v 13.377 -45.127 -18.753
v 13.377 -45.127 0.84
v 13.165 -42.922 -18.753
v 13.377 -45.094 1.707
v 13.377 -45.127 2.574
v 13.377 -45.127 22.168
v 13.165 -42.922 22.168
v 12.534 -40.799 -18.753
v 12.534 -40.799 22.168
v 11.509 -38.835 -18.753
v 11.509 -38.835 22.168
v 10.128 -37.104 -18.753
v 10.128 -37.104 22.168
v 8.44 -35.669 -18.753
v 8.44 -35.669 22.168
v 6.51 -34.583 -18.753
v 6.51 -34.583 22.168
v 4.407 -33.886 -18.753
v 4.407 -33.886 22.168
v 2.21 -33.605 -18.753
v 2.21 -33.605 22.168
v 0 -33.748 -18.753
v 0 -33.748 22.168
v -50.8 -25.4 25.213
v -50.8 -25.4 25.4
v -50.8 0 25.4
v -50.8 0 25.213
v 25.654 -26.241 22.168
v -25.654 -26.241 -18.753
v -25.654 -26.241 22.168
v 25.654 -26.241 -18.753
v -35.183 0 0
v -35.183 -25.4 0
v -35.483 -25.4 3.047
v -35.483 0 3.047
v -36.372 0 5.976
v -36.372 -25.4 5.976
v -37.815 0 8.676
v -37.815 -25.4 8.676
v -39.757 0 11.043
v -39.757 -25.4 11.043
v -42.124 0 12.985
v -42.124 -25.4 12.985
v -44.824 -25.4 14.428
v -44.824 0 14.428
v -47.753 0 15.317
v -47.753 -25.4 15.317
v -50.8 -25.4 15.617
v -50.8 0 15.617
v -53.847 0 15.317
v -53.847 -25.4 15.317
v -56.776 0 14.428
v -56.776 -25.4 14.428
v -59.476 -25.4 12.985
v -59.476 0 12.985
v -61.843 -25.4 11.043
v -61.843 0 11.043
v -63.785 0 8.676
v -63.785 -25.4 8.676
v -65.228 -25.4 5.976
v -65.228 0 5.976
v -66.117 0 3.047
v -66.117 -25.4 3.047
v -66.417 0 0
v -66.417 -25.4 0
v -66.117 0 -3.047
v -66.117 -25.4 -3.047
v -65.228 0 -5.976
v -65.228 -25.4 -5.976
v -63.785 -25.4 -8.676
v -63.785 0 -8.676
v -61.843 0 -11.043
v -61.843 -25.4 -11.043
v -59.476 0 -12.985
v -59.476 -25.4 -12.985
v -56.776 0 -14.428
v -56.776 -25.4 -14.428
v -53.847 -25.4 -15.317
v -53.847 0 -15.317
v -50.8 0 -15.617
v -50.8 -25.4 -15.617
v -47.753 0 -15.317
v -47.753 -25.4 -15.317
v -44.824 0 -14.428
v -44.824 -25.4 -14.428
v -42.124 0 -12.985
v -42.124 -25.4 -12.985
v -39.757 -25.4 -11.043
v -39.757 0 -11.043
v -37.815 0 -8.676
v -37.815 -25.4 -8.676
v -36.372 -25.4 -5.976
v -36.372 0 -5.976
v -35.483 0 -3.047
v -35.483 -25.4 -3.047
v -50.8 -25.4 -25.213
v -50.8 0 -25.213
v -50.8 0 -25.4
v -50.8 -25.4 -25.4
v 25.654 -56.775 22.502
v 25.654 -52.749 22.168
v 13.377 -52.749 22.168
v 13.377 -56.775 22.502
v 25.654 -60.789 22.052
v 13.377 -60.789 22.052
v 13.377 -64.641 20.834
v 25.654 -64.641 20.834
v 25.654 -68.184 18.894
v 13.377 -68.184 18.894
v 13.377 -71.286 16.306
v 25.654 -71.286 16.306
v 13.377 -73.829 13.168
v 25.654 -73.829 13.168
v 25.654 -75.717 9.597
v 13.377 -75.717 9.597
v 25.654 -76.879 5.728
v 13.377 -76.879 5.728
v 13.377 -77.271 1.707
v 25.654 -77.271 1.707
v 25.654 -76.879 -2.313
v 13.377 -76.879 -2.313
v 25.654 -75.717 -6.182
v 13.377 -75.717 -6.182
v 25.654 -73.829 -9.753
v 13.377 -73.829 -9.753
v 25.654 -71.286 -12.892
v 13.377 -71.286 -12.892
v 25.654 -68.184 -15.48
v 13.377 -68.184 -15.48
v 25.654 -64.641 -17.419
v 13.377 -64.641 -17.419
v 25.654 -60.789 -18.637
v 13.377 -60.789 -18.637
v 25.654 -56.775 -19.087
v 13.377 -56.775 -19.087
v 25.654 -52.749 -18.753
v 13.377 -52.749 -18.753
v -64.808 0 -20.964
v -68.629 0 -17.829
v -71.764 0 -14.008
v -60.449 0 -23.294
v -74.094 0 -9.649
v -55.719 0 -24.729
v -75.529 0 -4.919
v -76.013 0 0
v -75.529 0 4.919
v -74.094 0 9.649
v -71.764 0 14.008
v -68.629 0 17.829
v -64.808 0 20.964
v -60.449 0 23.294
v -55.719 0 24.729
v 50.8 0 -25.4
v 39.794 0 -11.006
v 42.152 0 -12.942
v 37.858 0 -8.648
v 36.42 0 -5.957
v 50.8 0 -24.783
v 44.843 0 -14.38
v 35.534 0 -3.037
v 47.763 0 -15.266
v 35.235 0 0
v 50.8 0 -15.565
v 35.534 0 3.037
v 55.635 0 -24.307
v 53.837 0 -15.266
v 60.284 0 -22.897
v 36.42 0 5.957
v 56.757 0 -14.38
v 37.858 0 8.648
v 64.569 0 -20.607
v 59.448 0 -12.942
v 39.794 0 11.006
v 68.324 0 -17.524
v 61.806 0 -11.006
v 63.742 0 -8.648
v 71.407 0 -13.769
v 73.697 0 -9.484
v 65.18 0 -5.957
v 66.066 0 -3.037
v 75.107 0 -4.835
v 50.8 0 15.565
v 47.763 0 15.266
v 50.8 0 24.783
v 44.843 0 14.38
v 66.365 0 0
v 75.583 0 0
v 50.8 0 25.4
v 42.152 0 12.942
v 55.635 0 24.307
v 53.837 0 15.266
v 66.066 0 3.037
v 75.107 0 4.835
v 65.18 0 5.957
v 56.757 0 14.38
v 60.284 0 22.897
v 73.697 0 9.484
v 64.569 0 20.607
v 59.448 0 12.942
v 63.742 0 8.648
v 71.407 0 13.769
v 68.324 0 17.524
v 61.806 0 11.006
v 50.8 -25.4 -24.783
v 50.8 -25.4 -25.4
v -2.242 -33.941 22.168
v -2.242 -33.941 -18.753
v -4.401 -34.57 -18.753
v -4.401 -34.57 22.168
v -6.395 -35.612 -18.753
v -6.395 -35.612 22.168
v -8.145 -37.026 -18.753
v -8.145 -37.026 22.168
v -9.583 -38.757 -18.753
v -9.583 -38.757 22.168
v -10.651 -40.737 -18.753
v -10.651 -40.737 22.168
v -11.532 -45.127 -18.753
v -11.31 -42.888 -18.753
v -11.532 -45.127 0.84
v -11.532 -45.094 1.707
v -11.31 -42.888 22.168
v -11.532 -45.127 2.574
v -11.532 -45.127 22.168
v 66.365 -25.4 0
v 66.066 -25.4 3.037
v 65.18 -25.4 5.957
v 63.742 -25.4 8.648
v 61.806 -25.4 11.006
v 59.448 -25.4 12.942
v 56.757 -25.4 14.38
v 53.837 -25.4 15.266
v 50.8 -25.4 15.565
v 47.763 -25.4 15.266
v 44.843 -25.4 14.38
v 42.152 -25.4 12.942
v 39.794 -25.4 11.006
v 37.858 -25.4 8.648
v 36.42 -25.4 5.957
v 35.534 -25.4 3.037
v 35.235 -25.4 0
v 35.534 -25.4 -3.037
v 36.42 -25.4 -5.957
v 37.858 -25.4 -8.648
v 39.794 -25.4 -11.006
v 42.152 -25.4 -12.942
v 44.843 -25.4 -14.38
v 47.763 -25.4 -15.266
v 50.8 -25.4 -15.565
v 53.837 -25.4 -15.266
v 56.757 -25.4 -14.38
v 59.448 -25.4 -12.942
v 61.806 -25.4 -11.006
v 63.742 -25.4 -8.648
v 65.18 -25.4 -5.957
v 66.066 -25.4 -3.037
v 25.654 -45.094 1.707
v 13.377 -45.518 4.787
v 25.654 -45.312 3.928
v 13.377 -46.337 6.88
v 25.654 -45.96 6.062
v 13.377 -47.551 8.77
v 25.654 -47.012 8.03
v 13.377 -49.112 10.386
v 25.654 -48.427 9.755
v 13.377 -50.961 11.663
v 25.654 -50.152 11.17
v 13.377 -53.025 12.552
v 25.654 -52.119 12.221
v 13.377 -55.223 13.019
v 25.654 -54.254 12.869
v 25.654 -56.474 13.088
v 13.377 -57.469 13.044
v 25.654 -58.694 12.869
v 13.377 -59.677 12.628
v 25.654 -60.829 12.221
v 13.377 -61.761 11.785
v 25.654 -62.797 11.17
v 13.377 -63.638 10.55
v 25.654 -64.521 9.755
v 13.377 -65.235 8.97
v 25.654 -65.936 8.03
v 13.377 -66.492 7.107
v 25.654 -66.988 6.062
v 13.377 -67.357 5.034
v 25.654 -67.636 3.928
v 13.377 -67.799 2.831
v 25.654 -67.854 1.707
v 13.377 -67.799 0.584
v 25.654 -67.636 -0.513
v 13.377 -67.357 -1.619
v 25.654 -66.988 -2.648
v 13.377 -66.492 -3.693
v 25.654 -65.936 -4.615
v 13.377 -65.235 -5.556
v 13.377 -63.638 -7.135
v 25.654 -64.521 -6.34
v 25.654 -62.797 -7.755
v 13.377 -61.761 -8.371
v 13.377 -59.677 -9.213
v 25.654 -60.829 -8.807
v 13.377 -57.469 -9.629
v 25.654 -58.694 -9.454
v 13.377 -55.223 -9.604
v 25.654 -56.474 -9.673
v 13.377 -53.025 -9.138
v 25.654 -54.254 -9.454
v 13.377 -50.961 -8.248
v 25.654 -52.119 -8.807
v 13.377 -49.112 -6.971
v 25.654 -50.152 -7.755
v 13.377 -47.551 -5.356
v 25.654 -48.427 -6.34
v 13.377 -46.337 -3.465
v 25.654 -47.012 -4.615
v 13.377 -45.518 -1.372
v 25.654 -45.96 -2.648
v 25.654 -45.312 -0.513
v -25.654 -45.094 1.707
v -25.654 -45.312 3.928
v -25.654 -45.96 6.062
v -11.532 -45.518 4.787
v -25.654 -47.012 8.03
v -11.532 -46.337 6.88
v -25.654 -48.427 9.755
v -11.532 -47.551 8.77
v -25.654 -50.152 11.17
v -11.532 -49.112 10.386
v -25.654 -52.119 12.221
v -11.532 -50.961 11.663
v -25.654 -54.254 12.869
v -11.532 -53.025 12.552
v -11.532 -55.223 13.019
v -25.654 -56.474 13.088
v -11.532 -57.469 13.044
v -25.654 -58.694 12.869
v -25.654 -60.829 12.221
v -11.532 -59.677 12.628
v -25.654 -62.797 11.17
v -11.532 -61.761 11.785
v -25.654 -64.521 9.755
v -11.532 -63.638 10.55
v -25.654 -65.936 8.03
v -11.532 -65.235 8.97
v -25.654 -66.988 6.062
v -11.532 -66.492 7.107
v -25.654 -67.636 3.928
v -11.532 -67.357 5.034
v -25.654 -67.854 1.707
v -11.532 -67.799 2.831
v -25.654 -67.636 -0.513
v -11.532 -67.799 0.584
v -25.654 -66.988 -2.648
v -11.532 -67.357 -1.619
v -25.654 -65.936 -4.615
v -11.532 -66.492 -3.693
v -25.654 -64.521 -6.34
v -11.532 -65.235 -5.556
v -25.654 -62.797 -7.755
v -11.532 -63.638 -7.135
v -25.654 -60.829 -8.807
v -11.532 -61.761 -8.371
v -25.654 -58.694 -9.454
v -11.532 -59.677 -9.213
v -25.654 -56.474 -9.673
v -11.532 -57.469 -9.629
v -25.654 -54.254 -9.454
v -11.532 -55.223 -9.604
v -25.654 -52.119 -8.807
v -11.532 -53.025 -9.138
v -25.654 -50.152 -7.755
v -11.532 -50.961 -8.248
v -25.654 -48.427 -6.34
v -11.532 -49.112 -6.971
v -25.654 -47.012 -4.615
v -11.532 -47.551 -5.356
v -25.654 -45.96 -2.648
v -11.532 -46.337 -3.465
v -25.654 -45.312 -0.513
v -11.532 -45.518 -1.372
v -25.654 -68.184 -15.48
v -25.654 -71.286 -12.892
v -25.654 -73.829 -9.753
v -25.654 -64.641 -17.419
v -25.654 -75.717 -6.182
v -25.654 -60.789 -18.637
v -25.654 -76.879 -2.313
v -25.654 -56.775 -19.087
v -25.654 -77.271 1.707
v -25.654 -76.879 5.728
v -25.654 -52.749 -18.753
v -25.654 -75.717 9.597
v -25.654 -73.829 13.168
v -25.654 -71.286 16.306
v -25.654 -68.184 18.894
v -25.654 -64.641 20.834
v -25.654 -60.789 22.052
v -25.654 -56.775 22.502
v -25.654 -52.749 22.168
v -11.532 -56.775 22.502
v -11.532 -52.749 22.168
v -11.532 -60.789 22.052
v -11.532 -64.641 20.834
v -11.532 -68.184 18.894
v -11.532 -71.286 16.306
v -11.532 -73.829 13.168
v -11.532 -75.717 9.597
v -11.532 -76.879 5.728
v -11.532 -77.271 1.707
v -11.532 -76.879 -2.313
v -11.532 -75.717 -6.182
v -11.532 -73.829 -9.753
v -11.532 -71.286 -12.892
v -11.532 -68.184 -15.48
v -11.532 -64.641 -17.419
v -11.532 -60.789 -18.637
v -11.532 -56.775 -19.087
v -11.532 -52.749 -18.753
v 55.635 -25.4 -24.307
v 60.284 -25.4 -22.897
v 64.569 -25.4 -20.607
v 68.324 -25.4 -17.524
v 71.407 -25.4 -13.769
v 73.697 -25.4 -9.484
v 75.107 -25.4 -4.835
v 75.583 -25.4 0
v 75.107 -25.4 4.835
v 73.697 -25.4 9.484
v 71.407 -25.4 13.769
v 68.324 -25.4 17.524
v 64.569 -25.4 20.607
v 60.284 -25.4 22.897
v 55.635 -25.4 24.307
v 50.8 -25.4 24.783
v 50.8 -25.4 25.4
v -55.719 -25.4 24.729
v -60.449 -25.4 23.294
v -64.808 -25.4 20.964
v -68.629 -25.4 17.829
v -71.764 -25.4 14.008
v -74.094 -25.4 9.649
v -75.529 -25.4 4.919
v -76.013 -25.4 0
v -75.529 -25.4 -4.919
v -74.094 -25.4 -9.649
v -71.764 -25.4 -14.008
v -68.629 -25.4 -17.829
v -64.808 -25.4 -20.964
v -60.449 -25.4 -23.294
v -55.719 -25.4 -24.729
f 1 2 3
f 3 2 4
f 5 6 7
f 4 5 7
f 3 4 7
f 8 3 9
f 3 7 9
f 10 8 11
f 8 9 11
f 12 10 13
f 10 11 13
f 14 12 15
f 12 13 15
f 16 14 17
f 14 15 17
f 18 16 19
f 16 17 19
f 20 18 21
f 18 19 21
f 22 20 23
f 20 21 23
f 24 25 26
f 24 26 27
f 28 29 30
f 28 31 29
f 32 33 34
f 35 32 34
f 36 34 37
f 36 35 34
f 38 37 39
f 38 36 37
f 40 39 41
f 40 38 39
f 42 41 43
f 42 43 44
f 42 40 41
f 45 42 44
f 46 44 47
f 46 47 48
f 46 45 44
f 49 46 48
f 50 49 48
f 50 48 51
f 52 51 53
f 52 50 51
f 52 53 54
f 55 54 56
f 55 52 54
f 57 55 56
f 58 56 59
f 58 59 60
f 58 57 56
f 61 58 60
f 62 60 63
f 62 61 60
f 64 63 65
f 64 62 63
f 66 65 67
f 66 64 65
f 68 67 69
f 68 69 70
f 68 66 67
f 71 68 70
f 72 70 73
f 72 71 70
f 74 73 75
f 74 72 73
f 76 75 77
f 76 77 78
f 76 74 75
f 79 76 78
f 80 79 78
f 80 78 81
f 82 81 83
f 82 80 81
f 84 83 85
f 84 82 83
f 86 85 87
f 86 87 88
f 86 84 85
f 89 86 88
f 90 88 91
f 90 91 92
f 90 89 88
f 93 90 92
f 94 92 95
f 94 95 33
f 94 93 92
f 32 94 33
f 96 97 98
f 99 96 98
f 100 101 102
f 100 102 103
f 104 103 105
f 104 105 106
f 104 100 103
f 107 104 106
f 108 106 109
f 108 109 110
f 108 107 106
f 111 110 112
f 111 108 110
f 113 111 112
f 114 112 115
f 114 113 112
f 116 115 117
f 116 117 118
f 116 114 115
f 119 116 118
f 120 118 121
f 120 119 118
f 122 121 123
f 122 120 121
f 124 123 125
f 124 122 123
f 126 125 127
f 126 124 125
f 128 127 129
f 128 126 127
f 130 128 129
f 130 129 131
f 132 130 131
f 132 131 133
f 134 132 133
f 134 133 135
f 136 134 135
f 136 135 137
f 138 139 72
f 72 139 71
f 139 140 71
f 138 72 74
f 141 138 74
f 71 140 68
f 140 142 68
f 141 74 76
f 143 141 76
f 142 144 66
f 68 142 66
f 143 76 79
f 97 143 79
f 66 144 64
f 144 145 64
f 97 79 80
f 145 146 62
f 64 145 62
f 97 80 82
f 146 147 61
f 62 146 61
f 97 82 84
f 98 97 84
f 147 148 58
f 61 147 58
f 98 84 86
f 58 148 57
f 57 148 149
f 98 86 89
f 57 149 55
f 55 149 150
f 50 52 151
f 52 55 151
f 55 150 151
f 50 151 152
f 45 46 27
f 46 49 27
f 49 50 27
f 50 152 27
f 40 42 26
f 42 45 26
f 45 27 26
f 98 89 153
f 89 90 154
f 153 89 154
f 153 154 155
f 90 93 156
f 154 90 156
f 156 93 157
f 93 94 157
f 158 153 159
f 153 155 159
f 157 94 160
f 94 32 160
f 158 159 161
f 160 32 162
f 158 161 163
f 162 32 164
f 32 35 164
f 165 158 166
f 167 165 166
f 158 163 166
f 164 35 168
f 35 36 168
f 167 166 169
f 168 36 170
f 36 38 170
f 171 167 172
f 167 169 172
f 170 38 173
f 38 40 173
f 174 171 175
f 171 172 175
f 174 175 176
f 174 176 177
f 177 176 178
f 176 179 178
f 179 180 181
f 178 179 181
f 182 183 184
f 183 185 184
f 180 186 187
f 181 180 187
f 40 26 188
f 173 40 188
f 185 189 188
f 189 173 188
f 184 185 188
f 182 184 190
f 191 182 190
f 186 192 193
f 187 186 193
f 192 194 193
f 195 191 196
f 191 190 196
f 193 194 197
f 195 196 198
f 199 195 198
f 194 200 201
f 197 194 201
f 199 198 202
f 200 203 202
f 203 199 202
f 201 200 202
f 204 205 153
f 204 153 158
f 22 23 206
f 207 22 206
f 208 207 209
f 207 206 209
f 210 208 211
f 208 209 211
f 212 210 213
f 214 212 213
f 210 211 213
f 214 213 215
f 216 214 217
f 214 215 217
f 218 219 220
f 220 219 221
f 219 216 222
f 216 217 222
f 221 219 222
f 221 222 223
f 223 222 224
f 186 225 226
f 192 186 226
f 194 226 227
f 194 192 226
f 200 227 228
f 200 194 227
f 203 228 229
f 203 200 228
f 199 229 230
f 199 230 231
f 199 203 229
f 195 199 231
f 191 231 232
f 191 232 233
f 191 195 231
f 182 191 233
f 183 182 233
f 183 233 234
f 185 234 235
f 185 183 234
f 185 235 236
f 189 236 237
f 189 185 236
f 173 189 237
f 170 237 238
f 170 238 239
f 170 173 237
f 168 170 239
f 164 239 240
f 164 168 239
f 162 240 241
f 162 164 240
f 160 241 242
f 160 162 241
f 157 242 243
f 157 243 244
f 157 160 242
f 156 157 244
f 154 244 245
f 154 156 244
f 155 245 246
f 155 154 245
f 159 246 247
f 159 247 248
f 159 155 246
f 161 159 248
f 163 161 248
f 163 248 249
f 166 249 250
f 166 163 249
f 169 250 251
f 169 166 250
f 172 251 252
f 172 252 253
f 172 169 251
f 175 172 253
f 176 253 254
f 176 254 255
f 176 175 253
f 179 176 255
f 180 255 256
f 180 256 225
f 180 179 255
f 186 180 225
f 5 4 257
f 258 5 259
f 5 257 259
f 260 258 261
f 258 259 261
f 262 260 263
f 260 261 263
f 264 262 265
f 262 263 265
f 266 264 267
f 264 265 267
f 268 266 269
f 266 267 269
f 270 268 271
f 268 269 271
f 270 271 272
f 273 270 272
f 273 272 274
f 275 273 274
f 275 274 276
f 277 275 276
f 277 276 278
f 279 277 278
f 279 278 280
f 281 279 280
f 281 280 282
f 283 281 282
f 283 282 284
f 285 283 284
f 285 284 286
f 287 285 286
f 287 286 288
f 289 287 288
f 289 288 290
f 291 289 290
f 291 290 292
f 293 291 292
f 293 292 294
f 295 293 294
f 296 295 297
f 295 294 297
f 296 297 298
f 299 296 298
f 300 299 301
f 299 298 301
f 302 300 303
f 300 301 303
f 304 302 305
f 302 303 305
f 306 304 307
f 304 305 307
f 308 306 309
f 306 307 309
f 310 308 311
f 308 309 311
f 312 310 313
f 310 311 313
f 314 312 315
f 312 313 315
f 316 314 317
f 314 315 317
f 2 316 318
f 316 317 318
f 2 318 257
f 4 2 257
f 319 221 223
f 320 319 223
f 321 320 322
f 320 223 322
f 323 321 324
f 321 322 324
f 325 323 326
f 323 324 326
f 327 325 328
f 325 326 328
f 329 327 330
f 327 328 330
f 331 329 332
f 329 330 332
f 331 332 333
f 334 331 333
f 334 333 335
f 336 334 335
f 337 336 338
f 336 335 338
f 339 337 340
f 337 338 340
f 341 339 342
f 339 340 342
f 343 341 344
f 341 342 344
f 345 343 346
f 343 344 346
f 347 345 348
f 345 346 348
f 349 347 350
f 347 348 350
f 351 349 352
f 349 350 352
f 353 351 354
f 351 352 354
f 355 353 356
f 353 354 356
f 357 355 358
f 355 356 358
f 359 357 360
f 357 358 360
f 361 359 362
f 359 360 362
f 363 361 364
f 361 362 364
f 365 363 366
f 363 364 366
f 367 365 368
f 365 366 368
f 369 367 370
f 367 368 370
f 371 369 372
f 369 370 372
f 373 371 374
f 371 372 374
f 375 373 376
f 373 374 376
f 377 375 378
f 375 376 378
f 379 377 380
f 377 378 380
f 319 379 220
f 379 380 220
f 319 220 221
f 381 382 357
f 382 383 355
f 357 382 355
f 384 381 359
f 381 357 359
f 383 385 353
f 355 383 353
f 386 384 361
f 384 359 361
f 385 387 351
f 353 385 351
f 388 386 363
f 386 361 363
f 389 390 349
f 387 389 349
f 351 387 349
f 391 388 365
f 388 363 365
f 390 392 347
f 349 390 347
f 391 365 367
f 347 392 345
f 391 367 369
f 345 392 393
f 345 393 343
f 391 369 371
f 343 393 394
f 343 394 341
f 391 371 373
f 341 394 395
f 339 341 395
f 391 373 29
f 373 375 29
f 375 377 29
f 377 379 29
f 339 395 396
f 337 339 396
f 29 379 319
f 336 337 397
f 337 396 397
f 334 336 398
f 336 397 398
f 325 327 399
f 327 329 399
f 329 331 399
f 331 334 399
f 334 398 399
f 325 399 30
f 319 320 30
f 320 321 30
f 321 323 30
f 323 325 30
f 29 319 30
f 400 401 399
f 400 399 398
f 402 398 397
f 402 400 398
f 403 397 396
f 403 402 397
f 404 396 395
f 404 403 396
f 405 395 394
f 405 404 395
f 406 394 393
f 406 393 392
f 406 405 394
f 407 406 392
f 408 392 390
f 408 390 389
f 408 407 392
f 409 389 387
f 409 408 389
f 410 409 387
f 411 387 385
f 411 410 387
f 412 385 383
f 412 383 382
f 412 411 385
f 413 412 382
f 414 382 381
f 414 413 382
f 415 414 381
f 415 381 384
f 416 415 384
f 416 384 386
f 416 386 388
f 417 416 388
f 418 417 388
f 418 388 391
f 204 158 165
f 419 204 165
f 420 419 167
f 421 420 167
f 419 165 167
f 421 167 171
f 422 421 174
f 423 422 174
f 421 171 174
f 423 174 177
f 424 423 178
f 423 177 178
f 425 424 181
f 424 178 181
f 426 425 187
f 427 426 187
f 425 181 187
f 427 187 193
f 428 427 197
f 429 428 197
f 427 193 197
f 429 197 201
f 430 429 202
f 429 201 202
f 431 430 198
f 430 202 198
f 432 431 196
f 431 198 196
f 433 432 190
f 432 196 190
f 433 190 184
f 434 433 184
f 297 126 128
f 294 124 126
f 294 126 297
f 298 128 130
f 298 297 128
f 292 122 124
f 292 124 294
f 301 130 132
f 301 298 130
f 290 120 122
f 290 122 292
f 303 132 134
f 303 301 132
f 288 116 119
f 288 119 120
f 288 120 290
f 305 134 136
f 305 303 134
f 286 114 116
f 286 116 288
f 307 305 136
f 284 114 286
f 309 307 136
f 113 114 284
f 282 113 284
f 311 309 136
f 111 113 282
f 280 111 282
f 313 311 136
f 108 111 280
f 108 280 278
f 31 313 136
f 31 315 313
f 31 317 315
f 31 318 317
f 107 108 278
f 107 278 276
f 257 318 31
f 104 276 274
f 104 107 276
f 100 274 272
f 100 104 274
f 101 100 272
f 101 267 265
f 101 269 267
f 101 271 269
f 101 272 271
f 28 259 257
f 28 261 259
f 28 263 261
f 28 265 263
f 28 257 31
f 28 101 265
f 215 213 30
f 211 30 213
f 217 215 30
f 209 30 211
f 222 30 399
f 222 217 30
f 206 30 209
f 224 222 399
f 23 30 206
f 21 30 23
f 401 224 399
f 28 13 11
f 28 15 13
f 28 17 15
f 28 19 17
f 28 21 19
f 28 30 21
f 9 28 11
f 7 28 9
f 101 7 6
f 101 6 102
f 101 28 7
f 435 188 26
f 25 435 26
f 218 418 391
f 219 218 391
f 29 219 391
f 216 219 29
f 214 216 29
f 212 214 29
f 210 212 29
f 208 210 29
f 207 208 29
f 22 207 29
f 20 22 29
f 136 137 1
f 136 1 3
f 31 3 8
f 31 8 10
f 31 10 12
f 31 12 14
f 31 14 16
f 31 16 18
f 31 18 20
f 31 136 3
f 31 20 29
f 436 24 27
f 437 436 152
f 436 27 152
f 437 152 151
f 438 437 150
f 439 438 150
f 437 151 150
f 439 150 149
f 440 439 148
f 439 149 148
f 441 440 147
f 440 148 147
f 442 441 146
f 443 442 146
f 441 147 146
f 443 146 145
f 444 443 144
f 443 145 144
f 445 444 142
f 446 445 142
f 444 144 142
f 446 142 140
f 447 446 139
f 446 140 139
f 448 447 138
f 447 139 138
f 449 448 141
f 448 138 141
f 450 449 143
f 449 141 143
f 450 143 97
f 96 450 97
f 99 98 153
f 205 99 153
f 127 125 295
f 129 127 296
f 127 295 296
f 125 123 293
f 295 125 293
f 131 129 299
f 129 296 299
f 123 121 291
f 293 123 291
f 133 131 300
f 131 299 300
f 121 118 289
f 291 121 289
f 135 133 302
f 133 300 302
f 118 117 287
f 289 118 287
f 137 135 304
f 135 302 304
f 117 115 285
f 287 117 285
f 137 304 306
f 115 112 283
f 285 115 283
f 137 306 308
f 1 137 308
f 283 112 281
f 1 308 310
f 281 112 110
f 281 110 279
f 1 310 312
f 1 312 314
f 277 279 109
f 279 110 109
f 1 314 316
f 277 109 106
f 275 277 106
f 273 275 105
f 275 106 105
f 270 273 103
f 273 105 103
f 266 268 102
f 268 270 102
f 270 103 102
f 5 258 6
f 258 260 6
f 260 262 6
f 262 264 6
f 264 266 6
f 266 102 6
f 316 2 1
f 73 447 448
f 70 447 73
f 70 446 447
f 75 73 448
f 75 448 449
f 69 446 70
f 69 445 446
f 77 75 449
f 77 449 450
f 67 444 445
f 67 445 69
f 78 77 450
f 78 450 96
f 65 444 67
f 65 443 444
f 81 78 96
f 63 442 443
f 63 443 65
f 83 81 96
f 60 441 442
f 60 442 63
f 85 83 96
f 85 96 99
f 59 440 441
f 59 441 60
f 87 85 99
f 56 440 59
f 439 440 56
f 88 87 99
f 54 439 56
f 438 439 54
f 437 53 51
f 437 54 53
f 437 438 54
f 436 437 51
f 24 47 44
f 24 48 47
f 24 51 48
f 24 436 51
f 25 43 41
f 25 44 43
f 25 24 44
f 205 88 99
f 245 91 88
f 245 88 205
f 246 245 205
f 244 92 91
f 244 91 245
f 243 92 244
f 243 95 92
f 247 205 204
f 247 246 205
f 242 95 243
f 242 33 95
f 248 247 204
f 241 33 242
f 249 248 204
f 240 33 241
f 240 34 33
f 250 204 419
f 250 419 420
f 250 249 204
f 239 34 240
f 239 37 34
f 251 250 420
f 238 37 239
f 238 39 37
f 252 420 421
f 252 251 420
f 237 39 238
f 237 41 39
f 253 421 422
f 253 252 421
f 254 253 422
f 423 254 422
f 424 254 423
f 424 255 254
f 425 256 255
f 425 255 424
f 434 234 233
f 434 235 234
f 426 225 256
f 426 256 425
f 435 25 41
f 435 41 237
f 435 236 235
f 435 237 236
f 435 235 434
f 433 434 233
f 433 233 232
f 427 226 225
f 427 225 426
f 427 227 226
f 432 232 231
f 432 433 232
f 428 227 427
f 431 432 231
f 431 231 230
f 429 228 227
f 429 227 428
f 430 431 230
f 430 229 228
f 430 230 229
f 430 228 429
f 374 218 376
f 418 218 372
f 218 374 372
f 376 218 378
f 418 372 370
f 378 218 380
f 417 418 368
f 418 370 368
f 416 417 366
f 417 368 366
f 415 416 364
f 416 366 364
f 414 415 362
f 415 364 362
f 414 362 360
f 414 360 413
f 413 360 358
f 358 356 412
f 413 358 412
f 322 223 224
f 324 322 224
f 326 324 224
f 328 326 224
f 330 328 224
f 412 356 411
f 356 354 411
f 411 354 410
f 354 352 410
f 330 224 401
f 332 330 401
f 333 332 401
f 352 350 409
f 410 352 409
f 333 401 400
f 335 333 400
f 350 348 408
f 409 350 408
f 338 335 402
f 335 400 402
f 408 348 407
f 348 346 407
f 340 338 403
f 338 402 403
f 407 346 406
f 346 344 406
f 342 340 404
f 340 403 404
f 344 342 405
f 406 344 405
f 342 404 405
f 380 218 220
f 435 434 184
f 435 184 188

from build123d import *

# Parameters (mm, degrees)
F0_R     = 15.616617
F0_R_2   = 15.565152
F1_DEPTH = 25.4
F3_DEPTH = 25.654
F5_DEPTH = 54.356
F6_R     = 11.380307
F7_DEPTH = 94.234


with BuildPart() as f1:
    # F0 (on Front) → F1 (new body)
    with BuildSketch(Plane.XZ):
        with BuildLine():
            Line((-50.8, -25.4), (50.8, -25.4))
            Line((50.8, -25.4), (50.8, -24.783274))
            ThreePointArc((50.8, -24.783274), (75.583274, 0), (50.8, 24.783274))
            Line((50.8, 24.783274), (50.8, 25.4))
            Line((50.8, 25.4), (-50.8, 25.4))
            Line((-50.8, 25.4), (-50.8, 25.213412))
            ThreePointArc((-50.8, 25.213412), (-76.013412, 0), (-50.8, -25.213412))
            Line((-50.8, -25.213412), (-50.8, -25.4))
        make_face()
        with Locations((-50.8, 0)):
            Circle(F0_R, mode=Mode.SUBTRACT)
        with Locations((50.8, 0)):
            Circle(F0_R_2, mode=Mode.SUBTRACT)
    extrude(amount=F1_DEPTH)


with BuildPart() as f3:
    # F2 (on Right) → F3 (new body, symmetric)
    with BuildSketch(Plane.YZ):
        with BuildLine():
            Line((-26.24115, -18.753318), (-26.24115, 22.168148))
            Line((-26.24115, 22.168148), (-52.749206, 22.168148))
            ThreePointArc((-52.749206, 22.168148), (-77.271091, 1.707415), (-52.749206, -18.753318))
            Line((-52.749206, -18.753318), (-26.24115, -18.753318))
        make_face()
    extrude(amount=F3_DEPTH, both=True)

    # F4 (on face) → F5 (cut, symmetric)
    with BuildSketch(Plane.XY.offset(22.168148)):
        with BuildLine():
            Line((-11.532298, -52.749206), (13.377465, -52.749206))
            Line((13.377465, -52.749206), (13.377465, -45.126837))
            ThreePointArc((13.377465, -45.126837), (9.318529, -36.345782), (0, -33.748299))
            ThreePointArc((0, -33.748299), (-8.145119, -37.026451), (-11.532298, -45.126837))
            Line((-11.532298, -45.126837), (-11.532298, -52.749206))
        make_face()
        Polygon((-11.532298, -78.339852), (13.377465, -77.417269), (13.377465, -52.749206), (-11.532298, -52.749206), align=None)
    extrude(amount=F5_DEPTH, both=True, mode=Mode.SUBTRACT)

    # F6 (on face) → F7 (cut)
    with BuildSketch(Plane.YZ.offset(25.654)):
        with Locations((-56.474067, 1.707415)):
            Circle(F6_R)
    extrude(amount=-F7_DEPTH, mode=Mode.SUBTRACT)


solid = Compound([f1.part, f3.part])
